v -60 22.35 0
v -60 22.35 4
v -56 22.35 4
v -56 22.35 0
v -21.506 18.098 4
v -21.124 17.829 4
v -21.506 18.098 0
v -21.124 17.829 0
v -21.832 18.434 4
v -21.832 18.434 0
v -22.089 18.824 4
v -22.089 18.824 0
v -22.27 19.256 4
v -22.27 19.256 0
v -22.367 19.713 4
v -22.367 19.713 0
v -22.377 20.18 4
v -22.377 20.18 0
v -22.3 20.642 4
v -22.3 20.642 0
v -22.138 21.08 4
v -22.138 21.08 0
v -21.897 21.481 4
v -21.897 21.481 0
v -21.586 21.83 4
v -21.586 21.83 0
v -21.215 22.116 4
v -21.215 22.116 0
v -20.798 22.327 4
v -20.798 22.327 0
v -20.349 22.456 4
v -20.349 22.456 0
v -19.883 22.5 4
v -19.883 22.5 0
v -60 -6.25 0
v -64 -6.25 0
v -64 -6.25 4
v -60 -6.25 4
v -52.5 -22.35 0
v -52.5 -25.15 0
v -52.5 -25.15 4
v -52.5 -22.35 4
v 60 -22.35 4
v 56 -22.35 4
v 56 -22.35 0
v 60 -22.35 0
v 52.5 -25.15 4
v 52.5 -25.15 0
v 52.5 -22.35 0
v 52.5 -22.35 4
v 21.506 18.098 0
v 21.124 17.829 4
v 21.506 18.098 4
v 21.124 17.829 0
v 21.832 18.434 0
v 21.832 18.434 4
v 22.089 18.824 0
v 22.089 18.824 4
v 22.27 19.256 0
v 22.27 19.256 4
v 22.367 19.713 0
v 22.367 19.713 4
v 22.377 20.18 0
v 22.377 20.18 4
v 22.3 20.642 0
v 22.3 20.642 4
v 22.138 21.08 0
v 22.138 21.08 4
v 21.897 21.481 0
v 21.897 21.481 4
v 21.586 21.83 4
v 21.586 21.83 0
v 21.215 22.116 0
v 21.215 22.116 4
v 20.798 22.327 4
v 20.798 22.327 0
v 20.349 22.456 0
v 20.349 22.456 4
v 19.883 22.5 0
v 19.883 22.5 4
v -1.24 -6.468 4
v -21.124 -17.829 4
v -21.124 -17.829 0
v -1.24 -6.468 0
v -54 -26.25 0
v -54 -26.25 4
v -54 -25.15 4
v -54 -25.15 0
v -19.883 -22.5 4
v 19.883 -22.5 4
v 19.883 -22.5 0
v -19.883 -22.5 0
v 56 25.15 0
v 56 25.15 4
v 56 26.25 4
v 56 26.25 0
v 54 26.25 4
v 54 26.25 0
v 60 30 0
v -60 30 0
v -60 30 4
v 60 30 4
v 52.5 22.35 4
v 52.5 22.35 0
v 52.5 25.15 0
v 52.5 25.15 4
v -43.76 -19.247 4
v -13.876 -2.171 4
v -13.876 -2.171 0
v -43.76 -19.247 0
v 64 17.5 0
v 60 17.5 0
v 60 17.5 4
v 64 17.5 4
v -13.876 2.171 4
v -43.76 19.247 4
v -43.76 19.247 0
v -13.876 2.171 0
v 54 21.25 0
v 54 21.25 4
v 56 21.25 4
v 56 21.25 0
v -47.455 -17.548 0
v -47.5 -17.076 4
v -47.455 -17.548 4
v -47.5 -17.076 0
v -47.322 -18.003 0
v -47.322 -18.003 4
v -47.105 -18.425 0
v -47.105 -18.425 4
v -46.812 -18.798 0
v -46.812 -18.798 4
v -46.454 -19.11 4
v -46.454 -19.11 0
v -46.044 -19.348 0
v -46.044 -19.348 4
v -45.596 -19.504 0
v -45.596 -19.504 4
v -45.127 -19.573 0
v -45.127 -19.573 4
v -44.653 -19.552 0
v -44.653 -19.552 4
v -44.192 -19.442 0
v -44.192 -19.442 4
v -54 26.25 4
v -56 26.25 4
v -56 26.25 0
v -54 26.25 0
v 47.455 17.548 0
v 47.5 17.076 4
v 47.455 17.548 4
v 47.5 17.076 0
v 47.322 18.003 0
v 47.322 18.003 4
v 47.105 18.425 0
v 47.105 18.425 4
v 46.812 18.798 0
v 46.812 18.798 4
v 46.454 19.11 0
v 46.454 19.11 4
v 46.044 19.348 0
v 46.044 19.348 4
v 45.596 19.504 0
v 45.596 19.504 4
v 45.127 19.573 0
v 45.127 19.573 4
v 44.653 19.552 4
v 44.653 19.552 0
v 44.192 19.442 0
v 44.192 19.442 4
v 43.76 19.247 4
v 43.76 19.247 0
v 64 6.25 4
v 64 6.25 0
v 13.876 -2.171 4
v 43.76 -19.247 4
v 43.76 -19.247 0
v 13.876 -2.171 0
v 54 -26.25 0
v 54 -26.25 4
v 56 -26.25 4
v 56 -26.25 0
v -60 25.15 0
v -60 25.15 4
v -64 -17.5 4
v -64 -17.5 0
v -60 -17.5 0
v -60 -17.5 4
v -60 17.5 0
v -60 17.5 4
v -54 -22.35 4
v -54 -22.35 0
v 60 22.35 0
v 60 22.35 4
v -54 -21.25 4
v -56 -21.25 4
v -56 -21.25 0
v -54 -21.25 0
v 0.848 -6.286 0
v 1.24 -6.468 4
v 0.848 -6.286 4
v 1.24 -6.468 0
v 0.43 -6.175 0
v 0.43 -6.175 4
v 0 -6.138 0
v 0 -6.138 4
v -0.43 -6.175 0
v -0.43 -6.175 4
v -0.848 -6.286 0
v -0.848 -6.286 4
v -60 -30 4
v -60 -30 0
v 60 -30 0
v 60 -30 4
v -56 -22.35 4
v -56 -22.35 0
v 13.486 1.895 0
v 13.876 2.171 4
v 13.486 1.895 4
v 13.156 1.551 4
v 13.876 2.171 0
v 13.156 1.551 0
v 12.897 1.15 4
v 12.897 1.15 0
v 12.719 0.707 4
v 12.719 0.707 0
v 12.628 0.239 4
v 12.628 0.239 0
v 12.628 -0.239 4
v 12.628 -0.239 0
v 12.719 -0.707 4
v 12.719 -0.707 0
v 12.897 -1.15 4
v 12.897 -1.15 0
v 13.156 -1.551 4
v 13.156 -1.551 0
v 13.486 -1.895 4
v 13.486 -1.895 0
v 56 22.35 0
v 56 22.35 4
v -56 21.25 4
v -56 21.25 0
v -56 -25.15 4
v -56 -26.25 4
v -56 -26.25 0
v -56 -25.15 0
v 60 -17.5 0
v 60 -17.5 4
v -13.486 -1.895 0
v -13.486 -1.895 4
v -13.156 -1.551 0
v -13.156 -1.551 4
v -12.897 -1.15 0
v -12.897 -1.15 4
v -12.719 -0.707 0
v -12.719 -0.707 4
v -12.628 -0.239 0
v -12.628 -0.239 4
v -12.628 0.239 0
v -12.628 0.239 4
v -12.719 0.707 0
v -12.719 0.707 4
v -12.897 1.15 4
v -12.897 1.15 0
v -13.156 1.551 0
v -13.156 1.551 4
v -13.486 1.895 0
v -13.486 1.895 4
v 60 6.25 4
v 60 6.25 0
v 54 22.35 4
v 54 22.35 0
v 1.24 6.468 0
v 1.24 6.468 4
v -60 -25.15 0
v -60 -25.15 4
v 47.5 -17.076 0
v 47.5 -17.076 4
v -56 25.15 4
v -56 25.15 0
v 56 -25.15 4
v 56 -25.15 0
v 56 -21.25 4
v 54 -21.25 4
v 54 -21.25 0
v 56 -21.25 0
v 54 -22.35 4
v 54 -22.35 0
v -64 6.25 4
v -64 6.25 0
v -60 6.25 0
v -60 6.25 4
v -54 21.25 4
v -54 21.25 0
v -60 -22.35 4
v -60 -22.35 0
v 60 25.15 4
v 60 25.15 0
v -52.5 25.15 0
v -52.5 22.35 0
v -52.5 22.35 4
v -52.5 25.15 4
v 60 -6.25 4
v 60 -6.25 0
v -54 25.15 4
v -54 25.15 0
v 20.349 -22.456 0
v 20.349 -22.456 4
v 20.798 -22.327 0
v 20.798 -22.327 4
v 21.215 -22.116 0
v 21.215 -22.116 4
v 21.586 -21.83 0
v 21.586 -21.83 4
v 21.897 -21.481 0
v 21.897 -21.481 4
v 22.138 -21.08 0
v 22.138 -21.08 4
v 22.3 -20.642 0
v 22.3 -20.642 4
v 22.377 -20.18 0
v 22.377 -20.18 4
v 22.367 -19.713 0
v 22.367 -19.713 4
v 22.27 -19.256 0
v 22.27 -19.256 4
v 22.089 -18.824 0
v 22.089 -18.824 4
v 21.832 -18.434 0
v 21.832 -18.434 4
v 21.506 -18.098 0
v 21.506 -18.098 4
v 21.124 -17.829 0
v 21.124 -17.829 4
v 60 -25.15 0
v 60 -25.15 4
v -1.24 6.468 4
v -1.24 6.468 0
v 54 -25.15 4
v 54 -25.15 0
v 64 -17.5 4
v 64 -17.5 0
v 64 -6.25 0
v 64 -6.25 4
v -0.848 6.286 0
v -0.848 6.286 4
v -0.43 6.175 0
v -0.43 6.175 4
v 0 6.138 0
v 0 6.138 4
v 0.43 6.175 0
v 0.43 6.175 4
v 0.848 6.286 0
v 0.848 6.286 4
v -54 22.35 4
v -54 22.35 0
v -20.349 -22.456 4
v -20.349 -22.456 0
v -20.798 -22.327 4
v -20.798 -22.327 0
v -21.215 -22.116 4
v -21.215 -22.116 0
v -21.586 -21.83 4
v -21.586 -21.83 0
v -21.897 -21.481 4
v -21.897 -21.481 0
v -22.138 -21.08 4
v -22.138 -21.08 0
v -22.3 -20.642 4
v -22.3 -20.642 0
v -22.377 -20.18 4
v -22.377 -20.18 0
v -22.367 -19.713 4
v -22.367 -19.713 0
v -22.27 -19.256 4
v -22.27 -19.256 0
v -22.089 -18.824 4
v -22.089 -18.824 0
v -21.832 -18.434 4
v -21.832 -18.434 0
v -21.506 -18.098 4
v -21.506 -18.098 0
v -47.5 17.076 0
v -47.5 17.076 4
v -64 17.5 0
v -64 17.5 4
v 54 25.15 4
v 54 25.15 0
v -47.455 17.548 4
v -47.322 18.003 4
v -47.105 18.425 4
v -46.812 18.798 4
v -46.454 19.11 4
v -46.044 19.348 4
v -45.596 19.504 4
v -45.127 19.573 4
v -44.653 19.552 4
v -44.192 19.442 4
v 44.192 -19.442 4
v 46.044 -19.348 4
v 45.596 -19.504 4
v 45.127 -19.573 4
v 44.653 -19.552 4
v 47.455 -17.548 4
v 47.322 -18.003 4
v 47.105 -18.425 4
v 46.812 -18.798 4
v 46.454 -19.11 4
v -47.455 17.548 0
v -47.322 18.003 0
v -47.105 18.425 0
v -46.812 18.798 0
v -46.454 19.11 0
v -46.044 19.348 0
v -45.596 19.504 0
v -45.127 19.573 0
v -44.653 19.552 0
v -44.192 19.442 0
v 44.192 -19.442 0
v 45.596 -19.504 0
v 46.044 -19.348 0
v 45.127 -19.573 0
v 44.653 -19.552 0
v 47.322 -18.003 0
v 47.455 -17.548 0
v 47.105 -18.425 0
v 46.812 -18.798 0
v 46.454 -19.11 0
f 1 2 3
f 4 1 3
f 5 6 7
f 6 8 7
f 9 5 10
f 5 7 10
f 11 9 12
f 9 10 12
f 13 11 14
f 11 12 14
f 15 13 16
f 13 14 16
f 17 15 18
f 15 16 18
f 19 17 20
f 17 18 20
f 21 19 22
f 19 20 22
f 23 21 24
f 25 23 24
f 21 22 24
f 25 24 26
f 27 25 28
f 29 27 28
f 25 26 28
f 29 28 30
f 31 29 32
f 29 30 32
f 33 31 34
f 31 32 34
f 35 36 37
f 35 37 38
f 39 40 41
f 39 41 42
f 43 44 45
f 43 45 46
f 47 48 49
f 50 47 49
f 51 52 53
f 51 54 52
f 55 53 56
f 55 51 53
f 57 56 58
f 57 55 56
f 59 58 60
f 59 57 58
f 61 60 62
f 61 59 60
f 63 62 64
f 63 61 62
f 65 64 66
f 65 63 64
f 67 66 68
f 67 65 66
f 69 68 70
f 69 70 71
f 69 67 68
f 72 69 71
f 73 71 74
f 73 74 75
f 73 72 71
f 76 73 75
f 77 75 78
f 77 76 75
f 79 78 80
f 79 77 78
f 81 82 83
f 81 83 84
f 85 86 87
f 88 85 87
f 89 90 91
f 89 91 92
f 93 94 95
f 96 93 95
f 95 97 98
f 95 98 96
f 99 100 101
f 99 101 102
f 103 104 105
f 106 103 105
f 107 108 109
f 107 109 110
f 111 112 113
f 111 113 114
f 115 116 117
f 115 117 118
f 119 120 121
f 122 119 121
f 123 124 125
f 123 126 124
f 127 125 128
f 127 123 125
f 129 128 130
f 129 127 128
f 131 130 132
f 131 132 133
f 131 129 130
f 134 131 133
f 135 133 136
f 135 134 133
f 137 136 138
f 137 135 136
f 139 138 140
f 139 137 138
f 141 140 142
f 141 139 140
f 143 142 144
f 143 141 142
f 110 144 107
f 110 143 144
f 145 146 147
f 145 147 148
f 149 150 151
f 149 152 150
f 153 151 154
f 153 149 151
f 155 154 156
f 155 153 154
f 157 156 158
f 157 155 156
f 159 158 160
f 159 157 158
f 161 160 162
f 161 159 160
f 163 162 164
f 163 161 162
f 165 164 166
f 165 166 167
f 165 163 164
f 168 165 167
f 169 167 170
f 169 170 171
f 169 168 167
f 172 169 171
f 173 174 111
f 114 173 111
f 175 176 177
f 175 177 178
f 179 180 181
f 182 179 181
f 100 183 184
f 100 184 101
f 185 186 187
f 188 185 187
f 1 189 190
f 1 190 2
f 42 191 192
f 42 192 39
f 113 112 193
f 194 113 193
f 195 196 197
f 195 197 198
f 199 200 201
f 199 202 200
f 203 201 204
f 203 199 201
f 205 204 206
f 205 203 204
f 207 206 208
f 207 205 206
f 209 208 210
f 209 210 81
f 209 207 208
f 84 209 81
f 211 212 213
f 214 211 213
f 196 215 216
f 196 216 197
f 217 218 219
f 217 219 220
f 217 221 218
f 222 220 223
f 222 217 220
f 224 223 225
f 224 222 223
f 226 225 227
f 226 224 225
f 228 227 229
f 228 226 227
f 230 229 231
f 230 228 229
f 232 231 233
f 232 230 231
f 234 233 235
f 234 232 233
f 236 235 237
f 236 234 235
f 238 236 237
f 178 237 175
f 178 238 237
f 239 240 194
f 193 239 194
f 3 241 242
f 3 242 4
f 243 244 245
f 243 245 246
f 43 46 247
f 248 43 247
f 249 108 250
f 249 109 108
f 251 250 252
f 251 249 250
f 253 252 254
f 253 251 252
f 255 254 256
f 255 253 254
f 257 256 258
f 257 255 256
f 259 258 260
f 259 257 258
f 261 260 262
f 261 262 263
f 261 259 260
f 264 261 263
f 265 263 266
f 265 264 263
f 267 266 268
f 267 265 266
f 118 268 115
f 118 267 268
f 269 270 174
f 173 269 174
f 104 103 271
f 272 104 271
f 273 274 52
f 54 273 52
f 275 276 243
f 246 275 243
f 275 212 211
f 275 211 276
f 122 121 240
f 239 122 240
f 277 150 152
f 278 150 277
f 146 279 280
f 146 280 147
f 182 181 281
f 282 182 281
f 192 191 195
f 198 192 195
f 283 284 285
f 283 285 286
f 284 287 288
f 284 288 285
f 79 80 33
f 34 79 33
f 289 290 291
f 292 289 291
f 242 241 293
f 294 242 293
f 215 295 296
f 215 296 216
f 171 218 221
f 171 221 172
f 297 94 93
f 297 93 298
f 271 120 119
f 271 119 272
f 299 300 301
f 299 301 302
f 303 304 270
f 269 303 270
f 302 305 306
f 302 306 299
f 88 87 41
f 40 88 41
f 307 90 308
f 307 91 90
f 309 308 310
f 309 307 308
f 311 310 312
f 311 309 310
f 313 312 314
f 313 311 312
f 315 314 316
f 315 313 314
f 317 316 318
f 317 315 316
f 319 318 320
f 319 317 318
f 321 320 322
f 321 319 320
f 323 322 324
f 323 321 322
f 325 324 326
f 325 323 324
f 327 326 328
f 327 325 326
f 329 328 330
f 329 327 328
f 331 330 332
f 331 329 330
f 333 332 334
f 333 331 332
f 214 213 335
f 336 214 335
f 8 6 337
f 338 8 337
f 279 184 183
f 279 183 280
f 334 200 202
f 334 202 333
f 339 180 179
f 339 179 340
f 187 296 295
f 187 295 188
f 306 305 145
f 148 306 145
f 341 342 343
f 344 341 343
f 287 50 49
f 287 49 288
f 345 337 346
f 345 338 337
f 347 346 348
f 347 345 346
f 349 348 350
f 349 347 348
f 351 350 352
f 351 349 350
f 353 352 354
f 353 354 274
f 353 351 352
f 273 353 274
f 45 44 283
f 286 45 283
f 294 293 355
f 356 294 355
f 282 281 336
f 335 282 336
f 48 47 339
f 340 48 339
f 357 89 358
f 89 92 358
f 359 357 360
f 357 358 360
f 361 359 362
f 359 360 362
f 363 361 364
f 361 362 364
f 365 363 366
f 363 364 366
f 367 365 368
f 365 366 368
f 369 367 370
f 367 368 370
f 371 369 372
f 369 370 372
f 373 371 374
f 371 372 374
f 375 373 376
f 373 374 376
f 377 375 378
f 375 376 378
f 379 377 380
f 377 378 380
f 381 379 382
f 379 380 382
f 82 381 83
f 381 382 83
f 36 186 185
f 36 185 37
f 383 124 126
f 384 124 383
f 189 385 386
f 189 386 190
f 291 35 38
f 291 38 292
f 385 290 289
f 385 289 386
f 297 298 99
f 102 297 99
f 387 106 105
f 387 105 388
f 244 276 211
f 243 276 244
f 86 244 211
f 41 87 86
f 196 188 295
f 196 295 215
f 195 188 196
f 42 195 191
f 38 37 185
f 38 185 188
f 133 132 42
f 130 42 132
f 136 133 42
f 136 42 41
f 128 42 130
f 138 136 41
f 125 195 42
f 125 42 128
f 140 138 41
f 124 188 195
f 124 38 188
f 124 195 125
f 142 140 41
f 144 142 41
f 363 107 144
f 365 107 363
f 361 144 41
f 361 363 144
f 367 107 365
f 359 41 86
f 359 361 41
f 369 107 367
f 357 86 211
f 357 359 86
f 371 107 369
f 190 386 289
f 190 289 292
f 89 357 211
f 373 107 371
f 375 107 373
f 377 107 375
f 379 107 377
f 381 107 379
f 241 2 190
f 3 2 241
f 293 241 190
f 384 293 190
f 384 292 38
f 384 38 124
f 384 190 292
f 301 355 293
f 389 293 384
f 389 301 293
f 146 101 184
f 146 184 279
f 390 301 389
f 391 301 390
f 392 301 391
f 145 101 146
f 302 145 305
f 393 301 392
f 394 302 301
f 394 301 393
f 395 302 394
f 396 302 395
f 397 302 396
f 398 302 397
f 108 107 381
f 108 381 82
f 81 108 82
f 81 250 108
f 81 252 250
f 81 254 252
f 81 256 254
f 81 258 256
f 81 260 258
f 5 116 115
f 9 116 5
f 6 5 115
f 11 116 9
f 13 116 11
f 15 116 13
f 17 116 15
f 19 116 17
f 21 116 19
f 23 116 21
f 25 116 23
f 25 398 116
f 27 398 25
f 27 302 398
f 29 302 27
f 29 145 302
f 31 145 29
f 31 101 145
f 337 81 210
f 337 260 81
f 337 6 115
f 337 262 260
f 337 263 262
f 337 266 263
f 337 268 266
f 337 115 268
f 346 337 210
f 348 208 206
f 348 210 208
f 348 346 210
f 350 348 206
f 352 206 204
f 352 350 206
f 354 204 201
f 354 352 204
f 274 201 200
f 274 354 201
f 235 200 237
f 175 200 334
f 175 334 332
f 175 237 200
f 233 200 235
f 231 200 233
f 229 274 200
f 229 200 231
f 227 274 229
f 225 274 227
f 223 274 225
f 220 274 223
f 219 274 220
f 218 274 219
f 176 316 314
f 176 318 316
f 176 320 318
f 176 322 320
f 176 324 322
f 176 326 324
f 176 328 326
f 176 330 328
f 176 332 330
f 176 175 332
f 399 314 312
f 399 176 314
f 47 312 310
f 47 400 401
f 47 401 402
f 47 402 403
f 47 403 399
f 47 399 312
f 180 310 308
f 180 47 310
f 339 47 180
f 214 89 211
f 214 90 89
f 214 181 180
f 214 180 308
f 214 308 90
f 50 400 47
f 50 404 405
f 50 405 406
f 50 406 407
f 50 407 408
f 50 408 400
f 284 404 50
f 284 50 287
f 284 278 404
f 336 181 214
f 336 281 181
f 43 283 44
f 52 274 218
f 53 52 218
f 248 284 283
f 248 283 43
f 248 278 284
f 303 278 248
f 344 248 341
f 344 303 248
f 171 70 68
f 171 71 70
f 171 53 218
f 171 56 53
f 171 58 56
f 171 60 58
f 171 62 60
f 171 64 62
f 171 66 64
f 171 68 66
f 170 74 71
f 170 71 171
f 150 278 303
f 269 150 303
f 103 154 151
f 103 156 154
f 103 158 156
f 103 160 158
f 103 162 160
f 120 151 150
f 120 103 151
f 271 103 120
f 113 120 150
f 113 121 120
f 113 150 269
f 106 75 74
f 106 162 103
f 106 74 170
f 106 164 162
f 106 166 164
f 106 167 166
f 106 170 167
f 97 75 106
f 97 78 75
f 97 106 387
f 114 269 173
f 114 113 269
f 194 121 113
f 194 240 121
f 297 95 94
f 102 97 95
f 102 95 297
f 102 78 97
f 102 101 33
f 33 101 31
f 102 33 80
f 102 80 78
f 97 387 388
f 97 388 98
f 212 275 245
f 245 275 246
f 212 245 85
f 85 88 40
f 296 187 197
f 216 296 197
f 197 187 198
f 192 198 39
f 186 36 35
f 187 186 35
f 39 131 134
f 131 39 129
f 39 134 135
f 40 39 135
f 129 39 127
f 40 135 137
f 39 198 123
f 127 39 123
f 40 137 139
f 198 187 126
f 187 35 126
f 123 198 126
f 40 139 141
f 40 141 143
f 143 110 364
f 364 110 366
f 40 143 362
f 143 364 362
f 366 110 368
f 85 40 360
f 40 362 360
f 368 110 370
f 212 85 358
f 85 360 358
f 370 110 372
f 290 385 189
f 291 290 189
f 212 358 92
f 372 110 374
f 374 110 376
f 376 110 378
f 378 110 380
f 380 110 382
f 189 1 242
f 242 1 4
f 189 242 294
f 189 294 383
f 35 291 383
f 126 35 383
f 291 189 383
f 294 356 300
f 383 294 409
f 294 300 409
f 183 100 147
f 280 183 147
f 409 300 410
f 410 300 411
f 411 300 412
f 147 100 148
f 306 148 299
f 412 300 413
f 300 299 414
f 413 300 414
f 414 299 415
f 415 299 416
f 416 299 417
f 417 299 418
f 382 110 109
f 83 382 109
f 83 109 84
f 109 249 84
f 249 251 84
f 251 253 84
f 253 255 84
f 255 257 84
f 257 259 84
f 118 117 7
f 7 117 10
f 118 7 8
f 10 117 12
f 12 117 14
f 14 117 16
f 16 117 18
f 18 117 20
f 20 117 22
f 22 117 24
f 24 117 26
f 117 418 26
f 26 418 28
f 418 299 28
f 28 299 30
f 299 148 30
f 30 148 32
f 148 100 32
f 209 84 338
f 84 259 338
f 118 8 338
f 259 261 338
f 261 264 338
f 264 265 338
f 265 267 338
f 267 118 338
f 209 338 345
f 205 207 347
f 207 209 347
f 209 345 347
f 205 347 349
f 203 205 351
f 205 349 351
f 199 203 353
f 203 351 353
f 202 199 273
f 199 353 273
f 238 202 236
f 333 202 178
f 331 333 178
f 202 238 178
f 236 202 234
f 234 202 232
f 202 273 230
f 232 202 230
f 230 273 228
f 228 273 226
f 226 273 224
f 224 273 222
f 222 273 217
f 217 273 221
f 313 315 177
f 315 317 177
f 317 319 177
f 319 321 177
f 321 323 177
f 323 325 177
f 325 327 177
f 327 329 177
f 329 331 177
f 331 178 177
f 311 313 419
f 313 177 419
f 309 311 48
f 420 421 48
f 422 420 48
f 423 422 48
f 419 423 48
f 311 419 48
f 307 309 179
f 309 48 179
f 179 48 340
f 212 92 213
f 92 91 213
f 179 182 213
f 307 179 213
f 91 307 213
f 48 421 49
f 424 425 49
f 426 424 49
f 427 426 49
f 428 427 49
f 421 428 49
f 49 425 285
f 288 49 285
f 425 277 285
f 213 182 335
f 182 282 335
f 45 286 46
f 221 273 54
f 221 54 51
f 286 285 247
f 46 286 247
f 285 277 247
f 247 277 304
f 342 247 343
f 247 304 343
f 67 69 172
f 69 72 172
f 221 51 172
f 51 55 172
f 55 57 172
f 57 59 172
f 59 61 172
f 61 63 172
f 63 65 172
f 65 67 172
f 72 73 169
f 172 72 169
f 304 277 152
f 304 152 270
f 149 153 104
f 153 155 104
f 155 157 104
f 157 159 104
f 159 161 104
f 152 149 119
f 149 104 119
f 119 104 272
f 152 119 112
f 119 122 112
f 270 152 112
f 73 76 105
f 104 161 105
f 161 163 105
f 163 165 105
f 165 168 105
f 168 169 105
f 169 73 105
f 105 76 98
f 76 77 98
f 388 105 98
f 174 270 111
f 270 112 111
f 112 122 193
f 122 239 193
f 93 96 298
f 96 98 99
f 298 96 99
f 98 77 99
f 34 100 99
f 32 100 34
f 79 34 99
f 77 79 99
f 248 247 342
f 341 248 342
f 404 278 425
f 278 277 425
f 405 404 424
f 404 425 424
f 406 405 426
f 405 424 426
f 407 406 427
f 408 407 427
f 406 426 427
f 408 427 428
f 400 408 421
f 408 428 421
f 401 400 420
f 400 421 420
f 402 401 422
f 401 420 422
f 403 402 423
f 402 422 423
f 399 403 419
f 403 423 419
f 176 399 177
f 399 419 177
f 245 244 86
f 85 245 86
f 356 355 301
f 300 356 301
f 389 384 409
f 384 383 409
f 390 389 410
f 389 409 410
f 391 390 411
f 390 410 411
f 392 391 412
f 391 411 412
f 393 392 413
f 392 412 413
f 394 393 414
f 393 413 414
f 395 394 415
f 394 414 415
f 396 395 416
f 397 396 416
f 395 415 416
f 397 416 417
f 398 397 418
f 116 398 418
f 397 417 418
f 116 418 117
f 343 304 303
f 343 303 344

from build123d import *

# Parameters (mm, degrees)
SKETCH_1_W          = 120
SKETCH_1_H          = 60
SKETCH_1_W_2        = 4
SKETCH_1_H_2        = 11.25
EXTRUDE_1_DEPTH     = 4
SKETCH_2_W          = 7.5
SKETCH_2_H          = 2.8
SKETCH_2_W_2        = 2
SKETCH_2_H_2        = 5
CUT_EXTRUDE_1_DEPTH = 4
CUT_EXTRUDE_2_DEPTH = 71.795480082
FILLET_1_R          = 2.5


with BuildPart() as part:
    # Эскиз1 → Бобышка-Вытянуть1 (new body)
    with BuildSketch(Plane.XY):
        Rectangle(SKETCH_1_W, SKETCH_1_H)
        with Locations((-62, -11.875)):
            Rectangle(SKETCH_1_W_2, SKETCH_1_H_2)
        with Locations((-62, 11.875)):
            Rectangle(SKETCH_1_W_2, SKETCH_1_H_2)
        with Locations((62, 11.875)):
            Rectangle(SKETCH_1_W_2, SKETCH_1_H_2)
        with Locations((62, -11.875)):
            Rectangle(SKETCH_1_W_2, SKETCH_1_H_2)
    extrude(amount=EXTRUDE_1_DEPTH)

    # Эскиз2 → Вырез-Вытянуть1 (cut)
    with BuildSketch(Plane.XY.offset(4)):
        with Locations((-56.25, 23.75)):
            Rectangle(SKETCH_2_W, SKETCH_2_H)
        with Locations((-55, 23.75)):
            Rectangle(SKETCH_2_W_2, SKETCH_2_H_2)
        with Locations((55, 23.75)):
            Rectangle(SKETCH_2_W_2, SKETCH_2_H_2)
        with Locations((56.25, 23.75)):
            Rectangle(SKETCH_2_W, SKETCH_2_H)
        with Locations((56.25, -23.75)):
            Rectangle(SKETCH_2_W, SKETCH_2_H)
        with Locations((55, -23.75)):
            Rectangle(SKETCH_2_W_2, SKETCH_2_H_2)
        with Locations((-55, -23.75)):
            Rectangle(SKETCH_2_W_2, SKETCH_2_H_2)
        with Locations((-56.25, -23.75)):
            Rectangle(SKETCH_2_W, SKETCH_2_H)
    extrude(amount=-CUT_EXTRUDE_1_DEPTH, mode=Mode.SUBTRACT)

    # Эскиз3 → Вырез-Вытянуть2 (cut, through all)
    with BuildSketch(Plane.XY.offset(4)):
        Polygon((-47.5, 21.384101608), (-10.077822185, 0), (-47.5, -21.384101608), align=None)
        Polygon((-29.297177815, 22.5), (0, 5.758755534), (29.297177815, 22.5), align=None)
        Polygon((47.5, -21.384101608), (10.077822185, 0), (47.5, 21.384101608), align=None)
        Polygon((-29.297177815, -22.5), (0, -5.758755534), (29.297177815, -22.5), align=None)
    extrude(amount=-CUT_EXTRUDE_2_DEPTH, mode=Mode.SUBTRACT)

    # Скругление1
    fillet_1_edges = [part.edges().sort_by_distance(p)[0] for p in [
        (47.5, -21.384101608, 2),
        (10.077822185, 0, 2),
        (47.5, 21.384101608, 2),
        (0, 5.758755534, 2),
        (-29.297177815, 22.5, 2),
        (29.297177815, 22.5, 2),
        (-29.297177815, -22.5, 2),
        (0, -5.758755534, 2),
        (29.297177815, -22.5, 2),
        (-47.5, 21.384101608, 2),
        (-10.077822185, 0, 2),
        (-47.5, -21.384101608, 2),
    ]]
    fillet(fillet_1_edges, radius=FILLET_1_R)


solid = part.part
